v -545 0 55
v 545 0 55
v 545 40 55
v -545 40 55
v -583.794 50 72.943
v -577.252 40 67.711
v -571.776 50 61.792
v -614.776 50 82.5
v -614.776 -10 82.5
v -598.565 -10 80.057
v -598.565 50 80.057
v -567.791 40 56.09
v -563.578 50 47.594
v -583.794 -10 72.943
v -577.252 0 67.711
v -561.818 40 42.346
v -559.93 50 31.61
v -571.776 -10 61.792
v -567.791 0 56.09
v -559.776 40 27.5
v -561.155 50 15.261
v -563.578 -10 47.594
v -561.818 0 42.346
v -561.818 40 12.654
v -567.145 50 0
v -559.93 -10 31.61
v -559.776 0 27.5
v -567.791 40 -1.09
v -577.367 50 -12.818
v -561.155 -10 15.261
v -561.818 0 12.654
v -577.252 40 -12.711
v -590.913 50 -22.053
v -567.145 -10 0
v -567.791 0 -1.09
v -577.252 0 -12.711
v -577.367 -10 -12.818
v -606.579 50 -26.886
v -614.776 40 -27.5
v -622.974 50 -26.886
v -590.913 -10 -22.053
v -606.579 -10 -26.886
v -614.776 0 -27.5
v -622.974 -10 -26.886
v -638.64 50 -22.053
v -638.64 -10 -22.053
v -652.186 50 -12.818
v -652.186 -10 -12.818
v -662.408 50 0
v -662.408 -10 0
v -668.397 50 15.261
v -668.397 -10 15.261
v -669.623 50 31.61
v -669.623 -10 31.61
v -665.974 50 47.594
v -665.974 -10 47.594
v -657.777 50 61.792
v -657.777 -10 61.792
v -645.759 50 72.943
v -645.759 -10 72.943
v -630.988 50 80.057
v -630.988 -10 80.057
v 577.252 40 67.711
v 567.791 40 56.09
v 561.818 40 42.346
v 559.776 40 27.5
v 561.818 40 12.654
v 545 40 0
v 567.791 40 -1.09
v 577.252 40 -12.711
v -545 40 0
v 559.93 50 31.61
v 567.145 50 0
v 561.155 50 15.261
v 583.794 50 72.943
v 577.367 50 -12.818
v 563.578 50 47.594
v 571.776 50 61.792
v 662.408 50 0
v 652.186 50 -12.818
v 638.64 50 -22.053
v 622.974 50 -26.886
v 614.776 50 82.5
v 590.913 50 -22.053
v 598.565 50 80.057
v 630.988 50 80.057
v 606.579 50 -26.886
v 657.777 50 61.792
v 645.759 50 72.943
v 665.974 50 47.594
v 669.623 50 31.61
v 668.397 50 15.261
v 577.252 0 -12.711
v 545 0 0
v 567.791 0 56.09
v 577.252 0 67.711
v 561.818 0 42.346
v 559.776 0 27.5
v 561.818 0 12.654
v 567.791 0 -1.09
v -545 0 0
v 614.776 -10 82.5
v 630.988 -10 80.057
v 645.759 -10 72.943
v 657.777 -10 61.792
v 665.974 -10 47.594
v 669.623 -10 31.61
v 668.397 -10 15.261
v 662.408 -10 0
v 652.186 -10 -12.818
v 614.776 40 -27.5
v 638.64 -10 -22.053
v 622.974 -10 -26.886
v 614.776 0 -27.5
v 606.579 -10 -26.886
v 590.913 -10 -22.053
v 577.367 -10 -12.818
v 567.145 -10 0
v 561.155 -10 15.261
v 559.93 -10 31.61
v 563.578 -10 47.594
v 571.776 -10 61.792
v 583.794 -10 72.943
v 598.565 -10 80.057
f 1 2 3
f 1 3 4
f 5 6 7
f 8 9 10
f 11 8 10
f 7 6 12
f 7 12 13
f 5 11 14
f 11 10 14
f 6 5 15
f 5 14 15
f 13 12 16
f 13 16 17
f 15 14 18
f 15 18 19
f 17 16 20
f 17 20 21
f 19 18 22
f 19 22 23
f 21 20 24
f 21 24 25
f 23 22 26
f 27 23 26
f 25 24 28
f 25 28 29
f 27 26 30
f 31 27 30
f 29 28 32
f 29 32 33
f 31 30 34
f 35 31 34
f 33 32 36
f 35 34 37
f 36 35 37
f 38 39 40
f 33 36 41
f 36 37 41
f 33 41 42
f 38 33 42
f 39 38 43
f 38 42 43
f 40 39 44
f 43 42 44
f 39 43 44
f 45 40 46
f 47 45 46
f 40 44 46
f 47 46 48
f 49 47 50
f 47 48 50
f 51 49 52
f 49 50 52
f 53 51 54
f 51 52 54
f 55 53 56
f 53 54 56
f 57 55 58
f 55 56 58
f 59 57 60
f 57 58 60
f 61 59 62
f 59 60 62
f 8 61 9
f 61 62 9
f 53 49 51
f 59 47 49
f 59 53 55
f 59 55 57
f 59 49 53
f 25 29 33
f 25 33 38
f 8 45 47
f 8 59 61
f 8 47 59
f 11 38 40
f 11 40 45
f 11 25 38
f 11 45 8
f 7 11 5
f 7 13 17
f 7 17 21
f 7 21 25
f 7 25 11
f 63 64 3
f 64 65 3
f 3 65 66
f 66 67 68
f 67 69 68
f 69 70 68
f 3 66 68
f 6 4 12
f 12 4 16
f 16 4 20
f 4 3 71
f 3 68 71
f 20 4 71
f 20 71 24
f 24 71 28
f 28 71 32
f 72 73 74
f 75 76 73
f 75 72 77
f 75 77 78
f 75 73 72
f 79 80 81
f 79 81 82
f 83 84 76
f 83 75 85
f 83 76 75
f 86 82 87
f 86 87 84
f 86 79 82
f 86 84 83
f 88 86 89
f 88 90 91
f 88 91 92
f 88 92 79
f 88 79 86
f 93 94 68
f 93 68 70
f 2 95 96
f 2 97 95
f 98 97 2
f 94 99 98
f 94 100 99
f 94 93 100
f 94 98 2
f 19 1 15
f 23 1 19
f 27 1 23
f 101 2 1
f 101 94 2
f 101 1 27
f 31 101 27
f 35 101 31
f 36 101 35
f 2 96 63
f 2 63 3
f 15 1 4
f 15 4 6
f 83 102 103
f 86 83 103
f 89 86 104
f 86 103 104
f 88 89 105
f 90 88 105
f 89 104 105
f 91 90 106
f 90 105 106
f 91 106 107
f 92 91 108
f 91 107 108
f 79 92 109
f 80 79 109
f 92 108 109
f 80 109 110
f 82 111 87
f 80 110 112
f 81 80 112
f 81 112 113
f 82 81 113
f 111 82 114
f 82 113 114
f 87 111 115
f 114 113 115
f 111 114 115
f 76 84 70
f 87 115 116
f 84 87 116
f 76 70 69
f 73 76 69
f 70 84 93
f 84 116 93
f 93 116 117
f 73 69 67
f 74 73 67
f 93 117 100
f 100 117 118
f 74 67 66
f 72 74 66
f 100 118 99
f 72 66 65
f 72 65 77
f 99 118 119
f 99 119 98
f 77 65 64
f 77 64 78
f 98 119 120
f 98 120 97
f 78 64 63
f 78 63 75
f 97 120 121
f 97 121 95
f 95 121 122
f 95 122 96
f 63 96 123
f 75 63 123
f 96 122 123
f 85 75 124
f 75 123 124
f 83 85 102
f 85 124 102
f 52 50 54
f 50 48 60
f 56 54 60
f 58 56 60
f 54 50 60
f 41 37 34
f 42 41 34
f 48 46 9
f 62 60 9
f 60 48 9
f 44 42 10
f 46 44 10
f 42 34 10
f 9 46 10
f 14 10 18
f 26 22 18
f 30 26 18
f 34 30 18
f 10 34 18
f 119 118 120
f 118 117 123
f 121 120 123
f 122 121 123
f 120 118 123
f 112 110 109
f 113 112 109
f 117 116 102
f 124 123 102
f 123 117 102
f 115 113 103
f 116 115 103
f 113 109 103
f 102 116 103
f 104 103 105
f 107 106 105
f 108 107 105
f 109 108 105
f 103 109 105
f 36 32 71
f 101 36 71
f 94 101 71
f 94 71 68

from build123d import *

# Parameters (mm, degrees)
BOSS_EXTRUDE1_DEPTH      = 40
BOSS_EXTRUDE2_DEPTH      = 10
BOSS_EXTRUDE2_DEPTH_BACK = 50
SKETCH3_R                = 55


with BuildPart() as part:
    # Sketch2 → Boss-Extrude1 (new body)
    with BuildSketch(Plane(origin=(0, 0, 0), x_dir=(1, 0, 0), z_dir=(0, 1, 0))):
        Polygon((-545, 0), (545, 0), (614.776428685, 27.5), (614.776428685, -82.5), (545, -55), (-545, -55), (-614.776428685, -82.5), (-614.776428685, 27.5), align=None)
    extrude(amount=BOSS_EXTRUDE1_DEPTH)

    # Sketch3 → Boss-Extrude2 (add, two sides: drawn at the far end of the back side and taken through both)
    with BuildSketch(Plane(origin=(0, 40, 0), x_dir=(1, 0, 0), z_dir=(0, 1, 0)).offset(-BOSS_EXTRUDE2_DEPTH_BACK)):
        with Locations(Location((-614.776428685, -27.5, 0), (0, 0, 270))):
            Circle(SKETCH3_R)
        with Locations(Location((614.776428685, -27.5, 0), (0, 0, 270))):
            Circle(SKETCH3_R)
    extrude(amount=BOSS_EXTRUDE2_DEPTH + BOSS_EXTRUDE2_DEPTH_BACK)


solid = part.part
